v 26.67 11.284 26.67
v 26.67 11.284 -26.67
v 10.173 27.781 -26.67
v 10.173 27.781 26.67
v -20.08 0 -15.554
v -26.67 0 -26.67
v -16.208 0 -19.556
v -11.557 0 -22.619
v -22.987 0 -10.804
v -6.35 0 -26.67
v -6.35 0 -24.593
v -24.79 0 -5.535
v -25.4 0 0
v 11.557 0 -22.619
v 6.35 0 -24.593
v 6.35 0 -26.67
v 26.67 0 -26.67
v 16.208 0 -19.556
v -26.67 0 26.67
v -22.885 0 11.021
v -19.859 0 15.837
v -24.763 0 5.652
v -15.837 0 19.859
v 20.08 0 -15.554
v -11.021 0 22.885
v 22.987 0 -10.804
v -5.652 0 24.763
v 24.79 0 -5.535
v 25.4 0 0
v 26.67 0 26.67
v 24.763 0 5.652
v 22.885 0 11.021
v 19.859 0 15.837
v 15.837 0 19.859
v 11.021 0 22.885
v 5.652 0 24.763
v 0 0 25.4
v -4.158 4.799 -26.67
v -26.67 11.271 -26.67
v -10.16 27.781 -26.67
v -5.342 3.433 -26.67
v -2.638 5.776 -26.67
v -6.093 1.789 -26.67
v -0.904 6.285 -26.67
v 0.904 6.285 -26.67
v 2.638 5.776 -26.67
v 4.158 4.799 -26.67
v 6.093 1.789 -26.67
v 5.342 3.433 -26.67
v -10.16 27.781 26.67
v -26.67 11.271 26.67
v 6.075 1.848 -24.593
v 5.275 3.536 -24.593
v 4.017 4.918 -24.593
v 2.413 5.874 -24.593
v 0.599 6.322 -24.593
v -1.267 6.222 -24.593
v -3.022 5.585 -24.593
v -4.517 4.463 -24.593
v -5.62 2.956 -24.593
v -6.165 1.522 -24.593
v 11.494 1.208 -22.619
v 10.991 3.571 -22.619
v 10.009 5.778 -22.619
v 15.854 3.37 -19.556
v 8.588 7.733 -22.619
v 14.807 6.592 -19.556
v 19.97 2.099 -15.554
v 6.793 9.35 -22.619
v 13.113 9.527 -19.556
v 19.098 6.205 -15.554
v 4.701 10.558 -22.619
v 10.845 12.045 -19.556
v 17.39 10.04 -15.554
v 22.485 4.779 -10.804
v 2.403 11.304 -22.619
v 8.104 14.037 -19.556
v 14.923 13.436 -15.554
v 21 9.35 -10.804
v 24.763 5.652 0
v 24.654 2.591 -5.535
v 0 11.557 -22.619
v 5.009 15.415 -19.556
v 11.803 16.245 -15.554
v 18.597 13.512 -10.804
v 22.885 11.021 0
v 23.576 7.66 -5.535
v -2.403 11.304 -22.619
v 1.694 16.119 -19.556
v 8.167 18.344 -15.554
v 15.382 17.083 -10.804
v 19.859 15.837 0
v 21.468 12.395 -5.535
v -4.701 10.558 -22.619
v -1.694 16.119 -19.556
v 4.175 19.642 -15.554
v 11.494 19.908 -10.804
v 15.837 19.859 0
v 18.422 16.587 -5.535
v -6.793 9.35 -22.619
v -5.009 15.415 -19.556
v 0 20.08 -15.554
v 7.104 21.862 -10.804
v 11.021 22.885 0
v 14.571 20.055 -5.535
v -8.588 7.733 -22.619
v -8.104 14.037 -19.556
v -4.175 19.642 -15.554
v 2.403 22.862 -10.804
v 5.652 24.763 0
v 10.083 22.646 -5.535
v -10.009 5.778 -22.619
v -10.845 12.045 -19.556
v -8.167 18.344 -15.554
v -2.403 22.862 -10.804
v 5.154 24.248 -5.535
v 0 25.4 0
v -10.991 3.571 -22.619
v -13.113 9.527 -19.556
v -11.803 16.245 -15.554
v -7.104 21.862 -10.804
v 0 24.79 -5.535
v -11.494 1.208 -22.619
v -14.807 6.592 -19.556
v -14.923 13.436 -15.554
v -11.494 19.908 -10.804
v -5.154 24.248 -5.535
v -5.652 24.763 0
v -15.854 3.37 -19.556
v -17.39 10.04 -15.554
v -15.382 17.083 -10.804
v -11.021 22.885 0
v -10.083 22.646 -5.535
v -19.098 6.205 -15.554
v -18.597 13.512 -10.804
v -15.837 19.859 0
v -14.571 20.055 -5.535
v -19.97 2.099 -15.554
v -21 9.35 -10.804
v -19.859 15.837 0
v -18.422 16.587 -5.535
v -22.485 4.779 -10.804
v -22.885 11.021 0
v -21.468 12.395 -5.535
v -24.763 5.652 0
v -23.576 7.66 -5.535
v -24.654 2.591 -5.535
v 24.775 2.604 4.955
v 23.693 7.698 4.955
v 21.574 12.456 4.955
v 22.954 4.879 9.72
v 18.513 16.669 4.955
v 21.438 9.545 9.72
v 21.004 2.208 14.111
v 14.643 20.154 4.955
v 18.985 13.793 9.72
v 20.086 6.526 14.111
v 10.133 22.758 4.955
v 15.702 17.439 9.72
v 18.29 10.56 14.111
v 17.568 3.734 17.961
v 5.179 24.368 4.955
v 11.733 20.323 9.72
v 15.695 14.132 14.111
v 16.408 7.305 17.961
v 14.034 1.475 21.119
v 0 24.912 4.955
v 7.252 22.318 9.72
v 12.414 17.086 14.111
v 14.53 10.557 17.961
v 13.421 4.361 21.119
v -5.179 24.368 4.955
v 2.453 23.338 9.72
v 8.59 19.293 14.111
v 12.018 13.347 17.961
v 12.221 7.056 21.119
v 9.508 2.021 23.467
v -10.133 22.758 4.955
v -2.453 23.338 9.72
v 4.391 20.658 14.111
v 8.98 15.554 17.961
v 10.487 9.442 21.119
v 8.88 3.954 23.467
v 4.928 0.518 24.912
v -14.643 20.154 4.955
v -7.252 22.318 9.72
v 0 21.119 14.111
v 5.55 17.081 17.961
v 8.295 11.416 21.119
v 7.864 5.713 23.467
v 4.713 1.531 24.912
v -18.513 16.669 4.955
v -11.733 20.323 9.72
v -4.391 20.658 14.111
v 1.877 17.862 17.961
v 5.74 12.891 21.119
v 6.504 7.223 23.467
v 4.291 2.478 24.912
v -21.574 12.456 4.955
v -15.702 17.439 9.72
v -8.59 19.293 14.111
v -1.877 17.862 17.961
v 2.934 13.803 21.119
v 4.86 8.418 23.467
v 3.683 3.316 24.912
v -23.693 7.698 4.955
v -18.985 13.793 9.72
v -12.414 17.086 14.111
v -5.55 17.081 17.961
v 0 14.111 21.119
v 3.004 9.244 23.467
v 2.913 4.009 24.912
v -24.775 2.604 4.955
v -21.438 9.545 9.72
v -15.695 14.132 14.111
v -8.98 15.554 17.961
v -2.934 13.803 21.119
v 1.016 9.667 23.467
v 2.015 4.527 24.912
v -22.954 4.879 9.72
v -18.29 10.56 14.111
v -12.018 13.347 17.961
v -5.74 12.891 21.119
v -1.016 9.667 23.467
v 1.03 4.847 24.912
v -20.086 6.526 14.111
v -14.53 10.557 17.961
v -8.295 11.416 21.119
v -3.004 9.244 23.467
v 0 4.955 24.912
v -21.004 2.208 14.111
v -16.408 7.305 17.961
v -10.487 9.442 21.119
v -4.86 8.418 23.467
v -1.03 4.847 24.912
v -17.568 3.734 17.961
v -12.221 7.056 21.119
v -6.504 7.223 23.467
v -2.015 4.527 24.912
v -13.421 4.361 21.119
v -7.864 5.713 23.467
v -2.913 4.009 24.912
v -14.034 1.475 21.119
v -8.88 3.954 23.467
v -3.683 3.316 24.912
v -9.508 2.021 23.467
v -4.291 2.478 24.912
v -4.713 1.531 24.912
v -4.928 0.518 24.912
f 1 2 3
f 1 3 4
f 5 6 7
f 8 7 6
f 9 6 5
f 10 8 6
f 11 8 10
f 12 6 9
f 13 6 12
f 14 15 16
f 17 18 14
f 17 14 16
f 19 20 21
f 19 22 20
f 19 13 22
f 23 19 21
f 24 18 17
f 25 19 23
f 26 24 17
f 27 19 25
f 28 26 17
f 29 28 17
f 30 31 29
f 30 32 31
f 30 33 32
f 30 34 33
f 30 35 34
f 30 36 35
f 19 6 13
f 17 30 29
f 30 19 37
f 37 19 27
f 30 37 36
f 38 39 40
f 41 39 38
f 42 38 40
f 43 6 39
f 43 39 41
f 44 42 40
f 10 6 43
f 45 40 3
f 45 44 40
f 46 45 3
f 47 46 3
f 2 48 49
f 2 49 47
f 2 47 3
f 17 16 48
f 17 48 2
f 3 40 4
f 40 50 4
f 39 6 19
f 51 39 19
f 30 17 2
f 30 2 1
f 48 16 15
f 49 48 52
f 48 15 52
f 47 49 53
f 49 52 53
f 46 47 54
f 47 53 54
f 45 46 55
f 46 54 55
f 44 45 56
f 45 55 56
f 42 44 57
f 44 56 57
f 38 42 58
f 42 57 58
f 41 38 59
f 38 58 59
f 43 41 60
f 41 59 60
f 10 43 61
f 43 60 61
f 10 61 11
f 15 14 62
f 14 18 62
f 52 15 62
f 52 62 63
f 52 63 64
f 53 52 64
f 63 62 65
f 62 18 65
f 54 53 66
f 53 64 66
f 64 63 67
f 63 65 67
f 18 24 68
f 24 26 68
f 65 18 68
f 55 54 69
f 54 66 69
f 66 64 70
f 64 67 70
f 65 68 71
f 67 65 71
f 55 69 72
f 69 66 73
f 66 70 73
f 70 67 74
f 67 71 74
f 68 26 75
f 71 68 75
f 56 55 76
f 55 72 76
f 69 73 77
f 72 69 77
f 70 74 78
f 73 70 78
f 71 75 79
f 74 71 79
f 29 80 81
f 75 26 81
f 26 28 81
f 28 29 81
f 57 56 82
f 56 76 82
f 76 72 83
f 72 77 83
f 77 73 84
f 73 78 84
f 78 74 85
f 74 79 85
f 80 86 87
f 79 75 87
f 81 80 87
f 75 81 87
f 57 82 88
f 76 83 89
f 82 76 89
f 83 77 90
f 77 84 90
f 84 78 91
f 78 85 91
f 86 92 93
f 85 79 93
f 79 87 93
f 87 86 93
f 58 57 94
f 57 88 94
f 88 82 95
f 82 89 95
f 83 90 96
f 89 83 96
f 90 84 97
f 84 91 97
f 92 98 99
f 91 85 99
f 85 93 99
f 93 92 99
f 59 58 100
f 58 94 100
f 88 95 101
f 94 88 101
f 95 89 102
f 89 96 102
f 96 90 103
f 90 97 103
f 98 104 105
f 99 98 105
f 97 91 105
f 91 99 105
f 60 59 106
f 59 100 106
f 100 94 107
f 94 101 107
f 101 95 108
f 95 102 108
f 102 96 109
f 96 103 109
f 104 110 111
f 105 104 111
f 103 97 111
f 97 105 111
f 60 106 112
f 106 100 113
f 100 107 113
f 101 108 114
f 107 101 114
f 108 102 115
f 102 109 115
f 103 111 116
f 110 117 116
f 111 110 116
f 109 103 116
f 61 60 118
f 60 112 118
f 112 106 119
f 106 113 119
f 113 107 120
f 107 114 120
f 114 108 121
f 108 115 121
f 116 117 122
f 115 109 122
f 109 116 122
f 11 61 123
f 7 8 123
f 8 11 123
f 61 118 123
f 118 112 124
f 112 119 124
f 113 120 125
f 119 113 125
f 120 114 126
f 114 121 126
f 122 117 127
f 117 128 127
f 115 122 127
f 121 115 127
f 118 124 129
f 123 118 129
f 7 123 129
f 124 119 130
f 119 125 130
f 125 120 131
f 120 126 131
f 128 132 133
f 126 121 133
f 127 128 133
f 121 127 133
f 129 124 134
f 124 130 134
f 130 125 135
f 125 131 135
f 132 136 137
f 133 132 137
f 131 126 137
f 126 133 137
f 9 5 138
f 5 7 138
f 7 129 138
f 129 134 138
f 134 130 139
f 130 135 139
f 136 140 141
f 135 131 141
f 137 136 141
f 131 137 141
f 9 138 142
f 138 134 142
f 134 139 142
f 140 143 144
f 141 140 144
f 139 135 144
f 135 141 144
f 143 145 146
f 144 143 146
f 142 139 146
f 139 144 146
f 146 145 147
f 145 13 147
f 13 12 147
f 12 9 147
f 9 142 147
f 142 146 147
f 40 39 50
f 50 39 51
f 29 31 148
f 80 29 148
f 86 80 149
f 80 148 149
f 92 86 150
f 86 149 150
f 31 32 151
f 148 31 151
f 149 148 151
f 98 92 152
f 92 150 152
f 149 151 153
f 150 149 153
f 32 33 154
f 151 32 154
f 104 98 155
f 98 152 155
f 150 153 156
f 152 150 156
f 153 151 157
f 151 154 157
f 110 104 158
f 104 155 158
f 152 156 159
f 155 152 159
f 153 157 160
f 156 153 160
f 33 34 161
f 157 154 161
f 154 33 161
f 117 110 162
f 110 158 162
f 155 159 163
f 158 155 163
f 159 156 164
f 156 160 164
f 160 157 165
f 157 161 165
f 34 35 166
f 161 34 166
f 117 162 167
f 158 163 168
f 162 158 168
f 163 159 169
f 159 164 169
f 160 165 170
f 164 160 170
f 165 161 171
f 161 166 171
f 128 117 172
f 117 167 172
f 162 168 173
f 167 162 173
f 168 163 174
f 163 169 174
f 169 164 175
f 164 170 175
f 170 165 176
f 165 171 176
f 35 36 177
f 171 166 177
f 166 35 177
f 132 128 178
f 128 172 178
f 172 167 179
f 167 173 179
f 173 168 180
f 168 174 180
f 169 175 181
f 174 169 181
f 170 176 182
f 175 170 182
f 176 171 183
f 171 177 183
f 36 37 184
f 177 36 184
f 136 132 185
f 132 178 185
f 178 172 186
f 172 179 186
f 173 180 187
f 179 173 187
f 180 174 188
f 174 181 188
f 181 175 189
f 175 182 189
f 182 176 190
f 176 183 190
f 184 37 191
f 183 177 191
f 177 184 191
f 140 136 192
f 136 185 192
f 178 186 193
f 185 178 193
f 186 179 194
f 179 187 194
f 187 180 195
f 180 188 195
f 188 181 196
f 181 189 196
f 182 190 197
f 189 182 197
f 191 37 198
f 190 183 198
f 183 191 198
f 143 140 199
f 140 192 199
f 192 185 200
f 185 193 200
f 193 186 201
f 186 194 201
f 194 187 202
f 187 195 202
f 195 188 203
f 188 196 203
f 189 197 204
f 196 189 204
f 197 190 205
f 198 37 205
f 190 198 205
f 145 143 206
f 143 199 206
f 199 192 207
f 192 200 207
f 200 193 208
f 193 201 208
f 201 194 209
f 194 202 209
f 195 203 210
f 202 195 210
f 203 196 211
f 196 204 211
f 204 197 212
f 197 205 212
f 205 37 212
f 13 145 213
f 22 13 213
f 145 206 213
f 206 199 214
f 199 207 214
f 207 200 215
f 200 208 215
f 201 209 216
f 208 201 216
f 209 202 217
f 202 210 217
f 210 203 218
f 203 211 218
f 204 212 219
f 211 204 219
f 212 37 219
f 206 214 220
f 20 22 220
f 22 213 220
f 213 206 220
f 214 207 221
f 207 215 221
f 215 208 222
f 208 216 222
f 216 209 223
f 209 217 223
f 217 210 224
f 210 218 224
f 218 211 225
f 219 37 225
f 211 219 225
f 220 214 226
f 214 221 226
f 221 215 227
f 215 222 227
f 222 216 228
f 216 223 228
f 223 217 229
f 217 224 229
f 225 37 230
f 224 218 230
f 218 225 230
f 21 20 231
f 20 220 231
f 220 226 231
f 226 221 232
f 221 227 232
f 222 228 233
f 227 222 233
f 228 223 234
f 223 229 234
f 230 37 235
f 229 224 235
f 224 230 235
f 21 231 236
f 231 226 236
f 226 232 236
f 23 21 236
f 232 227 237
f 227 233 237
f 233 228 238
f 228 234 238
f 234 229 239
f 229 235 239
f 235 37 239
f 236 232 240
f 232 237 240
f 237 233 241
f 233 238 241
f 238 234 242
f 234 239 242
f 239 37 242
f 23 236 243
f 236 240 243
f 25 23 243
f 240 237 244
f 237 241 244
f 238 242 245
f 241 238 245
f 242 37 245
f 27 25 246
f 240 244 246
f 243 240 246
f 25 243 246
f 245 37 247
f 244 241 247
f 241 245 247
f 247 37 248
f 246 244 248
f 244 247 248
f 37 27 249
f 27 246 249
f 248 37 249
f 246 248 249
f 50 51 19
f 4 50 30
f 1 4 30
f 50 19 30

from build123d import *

# Parameters (mm, degrees)
F0_W     = 53.34
F0_H     = 53.34
F1_DEPTH = 27.78125
F3_R     = 6.35
F4_DEPTH = 38.1
F5_SIZE  = 16.4973
F6_SIZE  = 16.51


with BuildPart() as f1:
    # F0 (on Front) → F1 (new body)
    with BuildSketch(Plane.XZ):
        Rectangle(F0_W, F0_H)
        with BuildLine():
            ThreePointArc((0, 25.4), (17.9605122421, 17.9605122421), (25.4, 0))
            ThreePointArc((25.4, 0), (17.9605122421, -17.9605122421), (0, -25.4))
            ThreePointArc((0, -25.4), (-25.4, 0), (0, 25.4))
        make_face(mode=Mode.SUBTRACT)
        with BuildLine():
            Line((0, -25.4), (0, 25.4))
            ThreePointArc((0, 25.4), (-25.4, 0), (0, -25.4))
        make_face()
        with BuildLine():
            ThreePointArc((0, -25.4), (17.9605122421, -17.9605122421), (25.4, 0))
            ThreePointArc((25.4, 0), (17.9605122421, 17.9605122421), (0, 25.4))
            Line((0, 25.4), (0, -25.4))
        make_face()
    extrude(amount=-F1_DEPTH)

    # F0 (on Front) → F2 (revolve, cut)
    with BuildSketch(Plane.XZ):
        with BuildLine():
            ThreePointArc((0, -25.4), (17.9605122421, -17.9605122421), (25.4, 0))
            ThreePointArc((25.4, 0), (17.9605122421, 17.9605122421), (0, 25.4))
            Line((0, 25.4), (0, -25.4))
        make_face()
    revolve(axis=Axis((0, 0, 0), (0, 0, 1)), mode=Mode.SUBTRACT)

    # F3 (on Top) → F4 (cut)
    with BuildSketch(Plane.XY):
        Circle(F3_R)
    extrude(amount=-F4_DEPTH, mode=Mode.SUBTRACT)

    # F5
    f5_edges = [f1.edges().sort_by_distance(p)[0] for p in [
        (26.67, 27.78125, 0),
    ]]
    chamfer(f5_edges, length=F5_SIZE)

    # F6
    f6_edges = [f1.edges().sort_by_distance(p)[0] for p in [
        (-26.67, 27.78125, 0),
    ]]
    chamfer(f6_edges, length=F6_SIZE)


solid = f1.part
